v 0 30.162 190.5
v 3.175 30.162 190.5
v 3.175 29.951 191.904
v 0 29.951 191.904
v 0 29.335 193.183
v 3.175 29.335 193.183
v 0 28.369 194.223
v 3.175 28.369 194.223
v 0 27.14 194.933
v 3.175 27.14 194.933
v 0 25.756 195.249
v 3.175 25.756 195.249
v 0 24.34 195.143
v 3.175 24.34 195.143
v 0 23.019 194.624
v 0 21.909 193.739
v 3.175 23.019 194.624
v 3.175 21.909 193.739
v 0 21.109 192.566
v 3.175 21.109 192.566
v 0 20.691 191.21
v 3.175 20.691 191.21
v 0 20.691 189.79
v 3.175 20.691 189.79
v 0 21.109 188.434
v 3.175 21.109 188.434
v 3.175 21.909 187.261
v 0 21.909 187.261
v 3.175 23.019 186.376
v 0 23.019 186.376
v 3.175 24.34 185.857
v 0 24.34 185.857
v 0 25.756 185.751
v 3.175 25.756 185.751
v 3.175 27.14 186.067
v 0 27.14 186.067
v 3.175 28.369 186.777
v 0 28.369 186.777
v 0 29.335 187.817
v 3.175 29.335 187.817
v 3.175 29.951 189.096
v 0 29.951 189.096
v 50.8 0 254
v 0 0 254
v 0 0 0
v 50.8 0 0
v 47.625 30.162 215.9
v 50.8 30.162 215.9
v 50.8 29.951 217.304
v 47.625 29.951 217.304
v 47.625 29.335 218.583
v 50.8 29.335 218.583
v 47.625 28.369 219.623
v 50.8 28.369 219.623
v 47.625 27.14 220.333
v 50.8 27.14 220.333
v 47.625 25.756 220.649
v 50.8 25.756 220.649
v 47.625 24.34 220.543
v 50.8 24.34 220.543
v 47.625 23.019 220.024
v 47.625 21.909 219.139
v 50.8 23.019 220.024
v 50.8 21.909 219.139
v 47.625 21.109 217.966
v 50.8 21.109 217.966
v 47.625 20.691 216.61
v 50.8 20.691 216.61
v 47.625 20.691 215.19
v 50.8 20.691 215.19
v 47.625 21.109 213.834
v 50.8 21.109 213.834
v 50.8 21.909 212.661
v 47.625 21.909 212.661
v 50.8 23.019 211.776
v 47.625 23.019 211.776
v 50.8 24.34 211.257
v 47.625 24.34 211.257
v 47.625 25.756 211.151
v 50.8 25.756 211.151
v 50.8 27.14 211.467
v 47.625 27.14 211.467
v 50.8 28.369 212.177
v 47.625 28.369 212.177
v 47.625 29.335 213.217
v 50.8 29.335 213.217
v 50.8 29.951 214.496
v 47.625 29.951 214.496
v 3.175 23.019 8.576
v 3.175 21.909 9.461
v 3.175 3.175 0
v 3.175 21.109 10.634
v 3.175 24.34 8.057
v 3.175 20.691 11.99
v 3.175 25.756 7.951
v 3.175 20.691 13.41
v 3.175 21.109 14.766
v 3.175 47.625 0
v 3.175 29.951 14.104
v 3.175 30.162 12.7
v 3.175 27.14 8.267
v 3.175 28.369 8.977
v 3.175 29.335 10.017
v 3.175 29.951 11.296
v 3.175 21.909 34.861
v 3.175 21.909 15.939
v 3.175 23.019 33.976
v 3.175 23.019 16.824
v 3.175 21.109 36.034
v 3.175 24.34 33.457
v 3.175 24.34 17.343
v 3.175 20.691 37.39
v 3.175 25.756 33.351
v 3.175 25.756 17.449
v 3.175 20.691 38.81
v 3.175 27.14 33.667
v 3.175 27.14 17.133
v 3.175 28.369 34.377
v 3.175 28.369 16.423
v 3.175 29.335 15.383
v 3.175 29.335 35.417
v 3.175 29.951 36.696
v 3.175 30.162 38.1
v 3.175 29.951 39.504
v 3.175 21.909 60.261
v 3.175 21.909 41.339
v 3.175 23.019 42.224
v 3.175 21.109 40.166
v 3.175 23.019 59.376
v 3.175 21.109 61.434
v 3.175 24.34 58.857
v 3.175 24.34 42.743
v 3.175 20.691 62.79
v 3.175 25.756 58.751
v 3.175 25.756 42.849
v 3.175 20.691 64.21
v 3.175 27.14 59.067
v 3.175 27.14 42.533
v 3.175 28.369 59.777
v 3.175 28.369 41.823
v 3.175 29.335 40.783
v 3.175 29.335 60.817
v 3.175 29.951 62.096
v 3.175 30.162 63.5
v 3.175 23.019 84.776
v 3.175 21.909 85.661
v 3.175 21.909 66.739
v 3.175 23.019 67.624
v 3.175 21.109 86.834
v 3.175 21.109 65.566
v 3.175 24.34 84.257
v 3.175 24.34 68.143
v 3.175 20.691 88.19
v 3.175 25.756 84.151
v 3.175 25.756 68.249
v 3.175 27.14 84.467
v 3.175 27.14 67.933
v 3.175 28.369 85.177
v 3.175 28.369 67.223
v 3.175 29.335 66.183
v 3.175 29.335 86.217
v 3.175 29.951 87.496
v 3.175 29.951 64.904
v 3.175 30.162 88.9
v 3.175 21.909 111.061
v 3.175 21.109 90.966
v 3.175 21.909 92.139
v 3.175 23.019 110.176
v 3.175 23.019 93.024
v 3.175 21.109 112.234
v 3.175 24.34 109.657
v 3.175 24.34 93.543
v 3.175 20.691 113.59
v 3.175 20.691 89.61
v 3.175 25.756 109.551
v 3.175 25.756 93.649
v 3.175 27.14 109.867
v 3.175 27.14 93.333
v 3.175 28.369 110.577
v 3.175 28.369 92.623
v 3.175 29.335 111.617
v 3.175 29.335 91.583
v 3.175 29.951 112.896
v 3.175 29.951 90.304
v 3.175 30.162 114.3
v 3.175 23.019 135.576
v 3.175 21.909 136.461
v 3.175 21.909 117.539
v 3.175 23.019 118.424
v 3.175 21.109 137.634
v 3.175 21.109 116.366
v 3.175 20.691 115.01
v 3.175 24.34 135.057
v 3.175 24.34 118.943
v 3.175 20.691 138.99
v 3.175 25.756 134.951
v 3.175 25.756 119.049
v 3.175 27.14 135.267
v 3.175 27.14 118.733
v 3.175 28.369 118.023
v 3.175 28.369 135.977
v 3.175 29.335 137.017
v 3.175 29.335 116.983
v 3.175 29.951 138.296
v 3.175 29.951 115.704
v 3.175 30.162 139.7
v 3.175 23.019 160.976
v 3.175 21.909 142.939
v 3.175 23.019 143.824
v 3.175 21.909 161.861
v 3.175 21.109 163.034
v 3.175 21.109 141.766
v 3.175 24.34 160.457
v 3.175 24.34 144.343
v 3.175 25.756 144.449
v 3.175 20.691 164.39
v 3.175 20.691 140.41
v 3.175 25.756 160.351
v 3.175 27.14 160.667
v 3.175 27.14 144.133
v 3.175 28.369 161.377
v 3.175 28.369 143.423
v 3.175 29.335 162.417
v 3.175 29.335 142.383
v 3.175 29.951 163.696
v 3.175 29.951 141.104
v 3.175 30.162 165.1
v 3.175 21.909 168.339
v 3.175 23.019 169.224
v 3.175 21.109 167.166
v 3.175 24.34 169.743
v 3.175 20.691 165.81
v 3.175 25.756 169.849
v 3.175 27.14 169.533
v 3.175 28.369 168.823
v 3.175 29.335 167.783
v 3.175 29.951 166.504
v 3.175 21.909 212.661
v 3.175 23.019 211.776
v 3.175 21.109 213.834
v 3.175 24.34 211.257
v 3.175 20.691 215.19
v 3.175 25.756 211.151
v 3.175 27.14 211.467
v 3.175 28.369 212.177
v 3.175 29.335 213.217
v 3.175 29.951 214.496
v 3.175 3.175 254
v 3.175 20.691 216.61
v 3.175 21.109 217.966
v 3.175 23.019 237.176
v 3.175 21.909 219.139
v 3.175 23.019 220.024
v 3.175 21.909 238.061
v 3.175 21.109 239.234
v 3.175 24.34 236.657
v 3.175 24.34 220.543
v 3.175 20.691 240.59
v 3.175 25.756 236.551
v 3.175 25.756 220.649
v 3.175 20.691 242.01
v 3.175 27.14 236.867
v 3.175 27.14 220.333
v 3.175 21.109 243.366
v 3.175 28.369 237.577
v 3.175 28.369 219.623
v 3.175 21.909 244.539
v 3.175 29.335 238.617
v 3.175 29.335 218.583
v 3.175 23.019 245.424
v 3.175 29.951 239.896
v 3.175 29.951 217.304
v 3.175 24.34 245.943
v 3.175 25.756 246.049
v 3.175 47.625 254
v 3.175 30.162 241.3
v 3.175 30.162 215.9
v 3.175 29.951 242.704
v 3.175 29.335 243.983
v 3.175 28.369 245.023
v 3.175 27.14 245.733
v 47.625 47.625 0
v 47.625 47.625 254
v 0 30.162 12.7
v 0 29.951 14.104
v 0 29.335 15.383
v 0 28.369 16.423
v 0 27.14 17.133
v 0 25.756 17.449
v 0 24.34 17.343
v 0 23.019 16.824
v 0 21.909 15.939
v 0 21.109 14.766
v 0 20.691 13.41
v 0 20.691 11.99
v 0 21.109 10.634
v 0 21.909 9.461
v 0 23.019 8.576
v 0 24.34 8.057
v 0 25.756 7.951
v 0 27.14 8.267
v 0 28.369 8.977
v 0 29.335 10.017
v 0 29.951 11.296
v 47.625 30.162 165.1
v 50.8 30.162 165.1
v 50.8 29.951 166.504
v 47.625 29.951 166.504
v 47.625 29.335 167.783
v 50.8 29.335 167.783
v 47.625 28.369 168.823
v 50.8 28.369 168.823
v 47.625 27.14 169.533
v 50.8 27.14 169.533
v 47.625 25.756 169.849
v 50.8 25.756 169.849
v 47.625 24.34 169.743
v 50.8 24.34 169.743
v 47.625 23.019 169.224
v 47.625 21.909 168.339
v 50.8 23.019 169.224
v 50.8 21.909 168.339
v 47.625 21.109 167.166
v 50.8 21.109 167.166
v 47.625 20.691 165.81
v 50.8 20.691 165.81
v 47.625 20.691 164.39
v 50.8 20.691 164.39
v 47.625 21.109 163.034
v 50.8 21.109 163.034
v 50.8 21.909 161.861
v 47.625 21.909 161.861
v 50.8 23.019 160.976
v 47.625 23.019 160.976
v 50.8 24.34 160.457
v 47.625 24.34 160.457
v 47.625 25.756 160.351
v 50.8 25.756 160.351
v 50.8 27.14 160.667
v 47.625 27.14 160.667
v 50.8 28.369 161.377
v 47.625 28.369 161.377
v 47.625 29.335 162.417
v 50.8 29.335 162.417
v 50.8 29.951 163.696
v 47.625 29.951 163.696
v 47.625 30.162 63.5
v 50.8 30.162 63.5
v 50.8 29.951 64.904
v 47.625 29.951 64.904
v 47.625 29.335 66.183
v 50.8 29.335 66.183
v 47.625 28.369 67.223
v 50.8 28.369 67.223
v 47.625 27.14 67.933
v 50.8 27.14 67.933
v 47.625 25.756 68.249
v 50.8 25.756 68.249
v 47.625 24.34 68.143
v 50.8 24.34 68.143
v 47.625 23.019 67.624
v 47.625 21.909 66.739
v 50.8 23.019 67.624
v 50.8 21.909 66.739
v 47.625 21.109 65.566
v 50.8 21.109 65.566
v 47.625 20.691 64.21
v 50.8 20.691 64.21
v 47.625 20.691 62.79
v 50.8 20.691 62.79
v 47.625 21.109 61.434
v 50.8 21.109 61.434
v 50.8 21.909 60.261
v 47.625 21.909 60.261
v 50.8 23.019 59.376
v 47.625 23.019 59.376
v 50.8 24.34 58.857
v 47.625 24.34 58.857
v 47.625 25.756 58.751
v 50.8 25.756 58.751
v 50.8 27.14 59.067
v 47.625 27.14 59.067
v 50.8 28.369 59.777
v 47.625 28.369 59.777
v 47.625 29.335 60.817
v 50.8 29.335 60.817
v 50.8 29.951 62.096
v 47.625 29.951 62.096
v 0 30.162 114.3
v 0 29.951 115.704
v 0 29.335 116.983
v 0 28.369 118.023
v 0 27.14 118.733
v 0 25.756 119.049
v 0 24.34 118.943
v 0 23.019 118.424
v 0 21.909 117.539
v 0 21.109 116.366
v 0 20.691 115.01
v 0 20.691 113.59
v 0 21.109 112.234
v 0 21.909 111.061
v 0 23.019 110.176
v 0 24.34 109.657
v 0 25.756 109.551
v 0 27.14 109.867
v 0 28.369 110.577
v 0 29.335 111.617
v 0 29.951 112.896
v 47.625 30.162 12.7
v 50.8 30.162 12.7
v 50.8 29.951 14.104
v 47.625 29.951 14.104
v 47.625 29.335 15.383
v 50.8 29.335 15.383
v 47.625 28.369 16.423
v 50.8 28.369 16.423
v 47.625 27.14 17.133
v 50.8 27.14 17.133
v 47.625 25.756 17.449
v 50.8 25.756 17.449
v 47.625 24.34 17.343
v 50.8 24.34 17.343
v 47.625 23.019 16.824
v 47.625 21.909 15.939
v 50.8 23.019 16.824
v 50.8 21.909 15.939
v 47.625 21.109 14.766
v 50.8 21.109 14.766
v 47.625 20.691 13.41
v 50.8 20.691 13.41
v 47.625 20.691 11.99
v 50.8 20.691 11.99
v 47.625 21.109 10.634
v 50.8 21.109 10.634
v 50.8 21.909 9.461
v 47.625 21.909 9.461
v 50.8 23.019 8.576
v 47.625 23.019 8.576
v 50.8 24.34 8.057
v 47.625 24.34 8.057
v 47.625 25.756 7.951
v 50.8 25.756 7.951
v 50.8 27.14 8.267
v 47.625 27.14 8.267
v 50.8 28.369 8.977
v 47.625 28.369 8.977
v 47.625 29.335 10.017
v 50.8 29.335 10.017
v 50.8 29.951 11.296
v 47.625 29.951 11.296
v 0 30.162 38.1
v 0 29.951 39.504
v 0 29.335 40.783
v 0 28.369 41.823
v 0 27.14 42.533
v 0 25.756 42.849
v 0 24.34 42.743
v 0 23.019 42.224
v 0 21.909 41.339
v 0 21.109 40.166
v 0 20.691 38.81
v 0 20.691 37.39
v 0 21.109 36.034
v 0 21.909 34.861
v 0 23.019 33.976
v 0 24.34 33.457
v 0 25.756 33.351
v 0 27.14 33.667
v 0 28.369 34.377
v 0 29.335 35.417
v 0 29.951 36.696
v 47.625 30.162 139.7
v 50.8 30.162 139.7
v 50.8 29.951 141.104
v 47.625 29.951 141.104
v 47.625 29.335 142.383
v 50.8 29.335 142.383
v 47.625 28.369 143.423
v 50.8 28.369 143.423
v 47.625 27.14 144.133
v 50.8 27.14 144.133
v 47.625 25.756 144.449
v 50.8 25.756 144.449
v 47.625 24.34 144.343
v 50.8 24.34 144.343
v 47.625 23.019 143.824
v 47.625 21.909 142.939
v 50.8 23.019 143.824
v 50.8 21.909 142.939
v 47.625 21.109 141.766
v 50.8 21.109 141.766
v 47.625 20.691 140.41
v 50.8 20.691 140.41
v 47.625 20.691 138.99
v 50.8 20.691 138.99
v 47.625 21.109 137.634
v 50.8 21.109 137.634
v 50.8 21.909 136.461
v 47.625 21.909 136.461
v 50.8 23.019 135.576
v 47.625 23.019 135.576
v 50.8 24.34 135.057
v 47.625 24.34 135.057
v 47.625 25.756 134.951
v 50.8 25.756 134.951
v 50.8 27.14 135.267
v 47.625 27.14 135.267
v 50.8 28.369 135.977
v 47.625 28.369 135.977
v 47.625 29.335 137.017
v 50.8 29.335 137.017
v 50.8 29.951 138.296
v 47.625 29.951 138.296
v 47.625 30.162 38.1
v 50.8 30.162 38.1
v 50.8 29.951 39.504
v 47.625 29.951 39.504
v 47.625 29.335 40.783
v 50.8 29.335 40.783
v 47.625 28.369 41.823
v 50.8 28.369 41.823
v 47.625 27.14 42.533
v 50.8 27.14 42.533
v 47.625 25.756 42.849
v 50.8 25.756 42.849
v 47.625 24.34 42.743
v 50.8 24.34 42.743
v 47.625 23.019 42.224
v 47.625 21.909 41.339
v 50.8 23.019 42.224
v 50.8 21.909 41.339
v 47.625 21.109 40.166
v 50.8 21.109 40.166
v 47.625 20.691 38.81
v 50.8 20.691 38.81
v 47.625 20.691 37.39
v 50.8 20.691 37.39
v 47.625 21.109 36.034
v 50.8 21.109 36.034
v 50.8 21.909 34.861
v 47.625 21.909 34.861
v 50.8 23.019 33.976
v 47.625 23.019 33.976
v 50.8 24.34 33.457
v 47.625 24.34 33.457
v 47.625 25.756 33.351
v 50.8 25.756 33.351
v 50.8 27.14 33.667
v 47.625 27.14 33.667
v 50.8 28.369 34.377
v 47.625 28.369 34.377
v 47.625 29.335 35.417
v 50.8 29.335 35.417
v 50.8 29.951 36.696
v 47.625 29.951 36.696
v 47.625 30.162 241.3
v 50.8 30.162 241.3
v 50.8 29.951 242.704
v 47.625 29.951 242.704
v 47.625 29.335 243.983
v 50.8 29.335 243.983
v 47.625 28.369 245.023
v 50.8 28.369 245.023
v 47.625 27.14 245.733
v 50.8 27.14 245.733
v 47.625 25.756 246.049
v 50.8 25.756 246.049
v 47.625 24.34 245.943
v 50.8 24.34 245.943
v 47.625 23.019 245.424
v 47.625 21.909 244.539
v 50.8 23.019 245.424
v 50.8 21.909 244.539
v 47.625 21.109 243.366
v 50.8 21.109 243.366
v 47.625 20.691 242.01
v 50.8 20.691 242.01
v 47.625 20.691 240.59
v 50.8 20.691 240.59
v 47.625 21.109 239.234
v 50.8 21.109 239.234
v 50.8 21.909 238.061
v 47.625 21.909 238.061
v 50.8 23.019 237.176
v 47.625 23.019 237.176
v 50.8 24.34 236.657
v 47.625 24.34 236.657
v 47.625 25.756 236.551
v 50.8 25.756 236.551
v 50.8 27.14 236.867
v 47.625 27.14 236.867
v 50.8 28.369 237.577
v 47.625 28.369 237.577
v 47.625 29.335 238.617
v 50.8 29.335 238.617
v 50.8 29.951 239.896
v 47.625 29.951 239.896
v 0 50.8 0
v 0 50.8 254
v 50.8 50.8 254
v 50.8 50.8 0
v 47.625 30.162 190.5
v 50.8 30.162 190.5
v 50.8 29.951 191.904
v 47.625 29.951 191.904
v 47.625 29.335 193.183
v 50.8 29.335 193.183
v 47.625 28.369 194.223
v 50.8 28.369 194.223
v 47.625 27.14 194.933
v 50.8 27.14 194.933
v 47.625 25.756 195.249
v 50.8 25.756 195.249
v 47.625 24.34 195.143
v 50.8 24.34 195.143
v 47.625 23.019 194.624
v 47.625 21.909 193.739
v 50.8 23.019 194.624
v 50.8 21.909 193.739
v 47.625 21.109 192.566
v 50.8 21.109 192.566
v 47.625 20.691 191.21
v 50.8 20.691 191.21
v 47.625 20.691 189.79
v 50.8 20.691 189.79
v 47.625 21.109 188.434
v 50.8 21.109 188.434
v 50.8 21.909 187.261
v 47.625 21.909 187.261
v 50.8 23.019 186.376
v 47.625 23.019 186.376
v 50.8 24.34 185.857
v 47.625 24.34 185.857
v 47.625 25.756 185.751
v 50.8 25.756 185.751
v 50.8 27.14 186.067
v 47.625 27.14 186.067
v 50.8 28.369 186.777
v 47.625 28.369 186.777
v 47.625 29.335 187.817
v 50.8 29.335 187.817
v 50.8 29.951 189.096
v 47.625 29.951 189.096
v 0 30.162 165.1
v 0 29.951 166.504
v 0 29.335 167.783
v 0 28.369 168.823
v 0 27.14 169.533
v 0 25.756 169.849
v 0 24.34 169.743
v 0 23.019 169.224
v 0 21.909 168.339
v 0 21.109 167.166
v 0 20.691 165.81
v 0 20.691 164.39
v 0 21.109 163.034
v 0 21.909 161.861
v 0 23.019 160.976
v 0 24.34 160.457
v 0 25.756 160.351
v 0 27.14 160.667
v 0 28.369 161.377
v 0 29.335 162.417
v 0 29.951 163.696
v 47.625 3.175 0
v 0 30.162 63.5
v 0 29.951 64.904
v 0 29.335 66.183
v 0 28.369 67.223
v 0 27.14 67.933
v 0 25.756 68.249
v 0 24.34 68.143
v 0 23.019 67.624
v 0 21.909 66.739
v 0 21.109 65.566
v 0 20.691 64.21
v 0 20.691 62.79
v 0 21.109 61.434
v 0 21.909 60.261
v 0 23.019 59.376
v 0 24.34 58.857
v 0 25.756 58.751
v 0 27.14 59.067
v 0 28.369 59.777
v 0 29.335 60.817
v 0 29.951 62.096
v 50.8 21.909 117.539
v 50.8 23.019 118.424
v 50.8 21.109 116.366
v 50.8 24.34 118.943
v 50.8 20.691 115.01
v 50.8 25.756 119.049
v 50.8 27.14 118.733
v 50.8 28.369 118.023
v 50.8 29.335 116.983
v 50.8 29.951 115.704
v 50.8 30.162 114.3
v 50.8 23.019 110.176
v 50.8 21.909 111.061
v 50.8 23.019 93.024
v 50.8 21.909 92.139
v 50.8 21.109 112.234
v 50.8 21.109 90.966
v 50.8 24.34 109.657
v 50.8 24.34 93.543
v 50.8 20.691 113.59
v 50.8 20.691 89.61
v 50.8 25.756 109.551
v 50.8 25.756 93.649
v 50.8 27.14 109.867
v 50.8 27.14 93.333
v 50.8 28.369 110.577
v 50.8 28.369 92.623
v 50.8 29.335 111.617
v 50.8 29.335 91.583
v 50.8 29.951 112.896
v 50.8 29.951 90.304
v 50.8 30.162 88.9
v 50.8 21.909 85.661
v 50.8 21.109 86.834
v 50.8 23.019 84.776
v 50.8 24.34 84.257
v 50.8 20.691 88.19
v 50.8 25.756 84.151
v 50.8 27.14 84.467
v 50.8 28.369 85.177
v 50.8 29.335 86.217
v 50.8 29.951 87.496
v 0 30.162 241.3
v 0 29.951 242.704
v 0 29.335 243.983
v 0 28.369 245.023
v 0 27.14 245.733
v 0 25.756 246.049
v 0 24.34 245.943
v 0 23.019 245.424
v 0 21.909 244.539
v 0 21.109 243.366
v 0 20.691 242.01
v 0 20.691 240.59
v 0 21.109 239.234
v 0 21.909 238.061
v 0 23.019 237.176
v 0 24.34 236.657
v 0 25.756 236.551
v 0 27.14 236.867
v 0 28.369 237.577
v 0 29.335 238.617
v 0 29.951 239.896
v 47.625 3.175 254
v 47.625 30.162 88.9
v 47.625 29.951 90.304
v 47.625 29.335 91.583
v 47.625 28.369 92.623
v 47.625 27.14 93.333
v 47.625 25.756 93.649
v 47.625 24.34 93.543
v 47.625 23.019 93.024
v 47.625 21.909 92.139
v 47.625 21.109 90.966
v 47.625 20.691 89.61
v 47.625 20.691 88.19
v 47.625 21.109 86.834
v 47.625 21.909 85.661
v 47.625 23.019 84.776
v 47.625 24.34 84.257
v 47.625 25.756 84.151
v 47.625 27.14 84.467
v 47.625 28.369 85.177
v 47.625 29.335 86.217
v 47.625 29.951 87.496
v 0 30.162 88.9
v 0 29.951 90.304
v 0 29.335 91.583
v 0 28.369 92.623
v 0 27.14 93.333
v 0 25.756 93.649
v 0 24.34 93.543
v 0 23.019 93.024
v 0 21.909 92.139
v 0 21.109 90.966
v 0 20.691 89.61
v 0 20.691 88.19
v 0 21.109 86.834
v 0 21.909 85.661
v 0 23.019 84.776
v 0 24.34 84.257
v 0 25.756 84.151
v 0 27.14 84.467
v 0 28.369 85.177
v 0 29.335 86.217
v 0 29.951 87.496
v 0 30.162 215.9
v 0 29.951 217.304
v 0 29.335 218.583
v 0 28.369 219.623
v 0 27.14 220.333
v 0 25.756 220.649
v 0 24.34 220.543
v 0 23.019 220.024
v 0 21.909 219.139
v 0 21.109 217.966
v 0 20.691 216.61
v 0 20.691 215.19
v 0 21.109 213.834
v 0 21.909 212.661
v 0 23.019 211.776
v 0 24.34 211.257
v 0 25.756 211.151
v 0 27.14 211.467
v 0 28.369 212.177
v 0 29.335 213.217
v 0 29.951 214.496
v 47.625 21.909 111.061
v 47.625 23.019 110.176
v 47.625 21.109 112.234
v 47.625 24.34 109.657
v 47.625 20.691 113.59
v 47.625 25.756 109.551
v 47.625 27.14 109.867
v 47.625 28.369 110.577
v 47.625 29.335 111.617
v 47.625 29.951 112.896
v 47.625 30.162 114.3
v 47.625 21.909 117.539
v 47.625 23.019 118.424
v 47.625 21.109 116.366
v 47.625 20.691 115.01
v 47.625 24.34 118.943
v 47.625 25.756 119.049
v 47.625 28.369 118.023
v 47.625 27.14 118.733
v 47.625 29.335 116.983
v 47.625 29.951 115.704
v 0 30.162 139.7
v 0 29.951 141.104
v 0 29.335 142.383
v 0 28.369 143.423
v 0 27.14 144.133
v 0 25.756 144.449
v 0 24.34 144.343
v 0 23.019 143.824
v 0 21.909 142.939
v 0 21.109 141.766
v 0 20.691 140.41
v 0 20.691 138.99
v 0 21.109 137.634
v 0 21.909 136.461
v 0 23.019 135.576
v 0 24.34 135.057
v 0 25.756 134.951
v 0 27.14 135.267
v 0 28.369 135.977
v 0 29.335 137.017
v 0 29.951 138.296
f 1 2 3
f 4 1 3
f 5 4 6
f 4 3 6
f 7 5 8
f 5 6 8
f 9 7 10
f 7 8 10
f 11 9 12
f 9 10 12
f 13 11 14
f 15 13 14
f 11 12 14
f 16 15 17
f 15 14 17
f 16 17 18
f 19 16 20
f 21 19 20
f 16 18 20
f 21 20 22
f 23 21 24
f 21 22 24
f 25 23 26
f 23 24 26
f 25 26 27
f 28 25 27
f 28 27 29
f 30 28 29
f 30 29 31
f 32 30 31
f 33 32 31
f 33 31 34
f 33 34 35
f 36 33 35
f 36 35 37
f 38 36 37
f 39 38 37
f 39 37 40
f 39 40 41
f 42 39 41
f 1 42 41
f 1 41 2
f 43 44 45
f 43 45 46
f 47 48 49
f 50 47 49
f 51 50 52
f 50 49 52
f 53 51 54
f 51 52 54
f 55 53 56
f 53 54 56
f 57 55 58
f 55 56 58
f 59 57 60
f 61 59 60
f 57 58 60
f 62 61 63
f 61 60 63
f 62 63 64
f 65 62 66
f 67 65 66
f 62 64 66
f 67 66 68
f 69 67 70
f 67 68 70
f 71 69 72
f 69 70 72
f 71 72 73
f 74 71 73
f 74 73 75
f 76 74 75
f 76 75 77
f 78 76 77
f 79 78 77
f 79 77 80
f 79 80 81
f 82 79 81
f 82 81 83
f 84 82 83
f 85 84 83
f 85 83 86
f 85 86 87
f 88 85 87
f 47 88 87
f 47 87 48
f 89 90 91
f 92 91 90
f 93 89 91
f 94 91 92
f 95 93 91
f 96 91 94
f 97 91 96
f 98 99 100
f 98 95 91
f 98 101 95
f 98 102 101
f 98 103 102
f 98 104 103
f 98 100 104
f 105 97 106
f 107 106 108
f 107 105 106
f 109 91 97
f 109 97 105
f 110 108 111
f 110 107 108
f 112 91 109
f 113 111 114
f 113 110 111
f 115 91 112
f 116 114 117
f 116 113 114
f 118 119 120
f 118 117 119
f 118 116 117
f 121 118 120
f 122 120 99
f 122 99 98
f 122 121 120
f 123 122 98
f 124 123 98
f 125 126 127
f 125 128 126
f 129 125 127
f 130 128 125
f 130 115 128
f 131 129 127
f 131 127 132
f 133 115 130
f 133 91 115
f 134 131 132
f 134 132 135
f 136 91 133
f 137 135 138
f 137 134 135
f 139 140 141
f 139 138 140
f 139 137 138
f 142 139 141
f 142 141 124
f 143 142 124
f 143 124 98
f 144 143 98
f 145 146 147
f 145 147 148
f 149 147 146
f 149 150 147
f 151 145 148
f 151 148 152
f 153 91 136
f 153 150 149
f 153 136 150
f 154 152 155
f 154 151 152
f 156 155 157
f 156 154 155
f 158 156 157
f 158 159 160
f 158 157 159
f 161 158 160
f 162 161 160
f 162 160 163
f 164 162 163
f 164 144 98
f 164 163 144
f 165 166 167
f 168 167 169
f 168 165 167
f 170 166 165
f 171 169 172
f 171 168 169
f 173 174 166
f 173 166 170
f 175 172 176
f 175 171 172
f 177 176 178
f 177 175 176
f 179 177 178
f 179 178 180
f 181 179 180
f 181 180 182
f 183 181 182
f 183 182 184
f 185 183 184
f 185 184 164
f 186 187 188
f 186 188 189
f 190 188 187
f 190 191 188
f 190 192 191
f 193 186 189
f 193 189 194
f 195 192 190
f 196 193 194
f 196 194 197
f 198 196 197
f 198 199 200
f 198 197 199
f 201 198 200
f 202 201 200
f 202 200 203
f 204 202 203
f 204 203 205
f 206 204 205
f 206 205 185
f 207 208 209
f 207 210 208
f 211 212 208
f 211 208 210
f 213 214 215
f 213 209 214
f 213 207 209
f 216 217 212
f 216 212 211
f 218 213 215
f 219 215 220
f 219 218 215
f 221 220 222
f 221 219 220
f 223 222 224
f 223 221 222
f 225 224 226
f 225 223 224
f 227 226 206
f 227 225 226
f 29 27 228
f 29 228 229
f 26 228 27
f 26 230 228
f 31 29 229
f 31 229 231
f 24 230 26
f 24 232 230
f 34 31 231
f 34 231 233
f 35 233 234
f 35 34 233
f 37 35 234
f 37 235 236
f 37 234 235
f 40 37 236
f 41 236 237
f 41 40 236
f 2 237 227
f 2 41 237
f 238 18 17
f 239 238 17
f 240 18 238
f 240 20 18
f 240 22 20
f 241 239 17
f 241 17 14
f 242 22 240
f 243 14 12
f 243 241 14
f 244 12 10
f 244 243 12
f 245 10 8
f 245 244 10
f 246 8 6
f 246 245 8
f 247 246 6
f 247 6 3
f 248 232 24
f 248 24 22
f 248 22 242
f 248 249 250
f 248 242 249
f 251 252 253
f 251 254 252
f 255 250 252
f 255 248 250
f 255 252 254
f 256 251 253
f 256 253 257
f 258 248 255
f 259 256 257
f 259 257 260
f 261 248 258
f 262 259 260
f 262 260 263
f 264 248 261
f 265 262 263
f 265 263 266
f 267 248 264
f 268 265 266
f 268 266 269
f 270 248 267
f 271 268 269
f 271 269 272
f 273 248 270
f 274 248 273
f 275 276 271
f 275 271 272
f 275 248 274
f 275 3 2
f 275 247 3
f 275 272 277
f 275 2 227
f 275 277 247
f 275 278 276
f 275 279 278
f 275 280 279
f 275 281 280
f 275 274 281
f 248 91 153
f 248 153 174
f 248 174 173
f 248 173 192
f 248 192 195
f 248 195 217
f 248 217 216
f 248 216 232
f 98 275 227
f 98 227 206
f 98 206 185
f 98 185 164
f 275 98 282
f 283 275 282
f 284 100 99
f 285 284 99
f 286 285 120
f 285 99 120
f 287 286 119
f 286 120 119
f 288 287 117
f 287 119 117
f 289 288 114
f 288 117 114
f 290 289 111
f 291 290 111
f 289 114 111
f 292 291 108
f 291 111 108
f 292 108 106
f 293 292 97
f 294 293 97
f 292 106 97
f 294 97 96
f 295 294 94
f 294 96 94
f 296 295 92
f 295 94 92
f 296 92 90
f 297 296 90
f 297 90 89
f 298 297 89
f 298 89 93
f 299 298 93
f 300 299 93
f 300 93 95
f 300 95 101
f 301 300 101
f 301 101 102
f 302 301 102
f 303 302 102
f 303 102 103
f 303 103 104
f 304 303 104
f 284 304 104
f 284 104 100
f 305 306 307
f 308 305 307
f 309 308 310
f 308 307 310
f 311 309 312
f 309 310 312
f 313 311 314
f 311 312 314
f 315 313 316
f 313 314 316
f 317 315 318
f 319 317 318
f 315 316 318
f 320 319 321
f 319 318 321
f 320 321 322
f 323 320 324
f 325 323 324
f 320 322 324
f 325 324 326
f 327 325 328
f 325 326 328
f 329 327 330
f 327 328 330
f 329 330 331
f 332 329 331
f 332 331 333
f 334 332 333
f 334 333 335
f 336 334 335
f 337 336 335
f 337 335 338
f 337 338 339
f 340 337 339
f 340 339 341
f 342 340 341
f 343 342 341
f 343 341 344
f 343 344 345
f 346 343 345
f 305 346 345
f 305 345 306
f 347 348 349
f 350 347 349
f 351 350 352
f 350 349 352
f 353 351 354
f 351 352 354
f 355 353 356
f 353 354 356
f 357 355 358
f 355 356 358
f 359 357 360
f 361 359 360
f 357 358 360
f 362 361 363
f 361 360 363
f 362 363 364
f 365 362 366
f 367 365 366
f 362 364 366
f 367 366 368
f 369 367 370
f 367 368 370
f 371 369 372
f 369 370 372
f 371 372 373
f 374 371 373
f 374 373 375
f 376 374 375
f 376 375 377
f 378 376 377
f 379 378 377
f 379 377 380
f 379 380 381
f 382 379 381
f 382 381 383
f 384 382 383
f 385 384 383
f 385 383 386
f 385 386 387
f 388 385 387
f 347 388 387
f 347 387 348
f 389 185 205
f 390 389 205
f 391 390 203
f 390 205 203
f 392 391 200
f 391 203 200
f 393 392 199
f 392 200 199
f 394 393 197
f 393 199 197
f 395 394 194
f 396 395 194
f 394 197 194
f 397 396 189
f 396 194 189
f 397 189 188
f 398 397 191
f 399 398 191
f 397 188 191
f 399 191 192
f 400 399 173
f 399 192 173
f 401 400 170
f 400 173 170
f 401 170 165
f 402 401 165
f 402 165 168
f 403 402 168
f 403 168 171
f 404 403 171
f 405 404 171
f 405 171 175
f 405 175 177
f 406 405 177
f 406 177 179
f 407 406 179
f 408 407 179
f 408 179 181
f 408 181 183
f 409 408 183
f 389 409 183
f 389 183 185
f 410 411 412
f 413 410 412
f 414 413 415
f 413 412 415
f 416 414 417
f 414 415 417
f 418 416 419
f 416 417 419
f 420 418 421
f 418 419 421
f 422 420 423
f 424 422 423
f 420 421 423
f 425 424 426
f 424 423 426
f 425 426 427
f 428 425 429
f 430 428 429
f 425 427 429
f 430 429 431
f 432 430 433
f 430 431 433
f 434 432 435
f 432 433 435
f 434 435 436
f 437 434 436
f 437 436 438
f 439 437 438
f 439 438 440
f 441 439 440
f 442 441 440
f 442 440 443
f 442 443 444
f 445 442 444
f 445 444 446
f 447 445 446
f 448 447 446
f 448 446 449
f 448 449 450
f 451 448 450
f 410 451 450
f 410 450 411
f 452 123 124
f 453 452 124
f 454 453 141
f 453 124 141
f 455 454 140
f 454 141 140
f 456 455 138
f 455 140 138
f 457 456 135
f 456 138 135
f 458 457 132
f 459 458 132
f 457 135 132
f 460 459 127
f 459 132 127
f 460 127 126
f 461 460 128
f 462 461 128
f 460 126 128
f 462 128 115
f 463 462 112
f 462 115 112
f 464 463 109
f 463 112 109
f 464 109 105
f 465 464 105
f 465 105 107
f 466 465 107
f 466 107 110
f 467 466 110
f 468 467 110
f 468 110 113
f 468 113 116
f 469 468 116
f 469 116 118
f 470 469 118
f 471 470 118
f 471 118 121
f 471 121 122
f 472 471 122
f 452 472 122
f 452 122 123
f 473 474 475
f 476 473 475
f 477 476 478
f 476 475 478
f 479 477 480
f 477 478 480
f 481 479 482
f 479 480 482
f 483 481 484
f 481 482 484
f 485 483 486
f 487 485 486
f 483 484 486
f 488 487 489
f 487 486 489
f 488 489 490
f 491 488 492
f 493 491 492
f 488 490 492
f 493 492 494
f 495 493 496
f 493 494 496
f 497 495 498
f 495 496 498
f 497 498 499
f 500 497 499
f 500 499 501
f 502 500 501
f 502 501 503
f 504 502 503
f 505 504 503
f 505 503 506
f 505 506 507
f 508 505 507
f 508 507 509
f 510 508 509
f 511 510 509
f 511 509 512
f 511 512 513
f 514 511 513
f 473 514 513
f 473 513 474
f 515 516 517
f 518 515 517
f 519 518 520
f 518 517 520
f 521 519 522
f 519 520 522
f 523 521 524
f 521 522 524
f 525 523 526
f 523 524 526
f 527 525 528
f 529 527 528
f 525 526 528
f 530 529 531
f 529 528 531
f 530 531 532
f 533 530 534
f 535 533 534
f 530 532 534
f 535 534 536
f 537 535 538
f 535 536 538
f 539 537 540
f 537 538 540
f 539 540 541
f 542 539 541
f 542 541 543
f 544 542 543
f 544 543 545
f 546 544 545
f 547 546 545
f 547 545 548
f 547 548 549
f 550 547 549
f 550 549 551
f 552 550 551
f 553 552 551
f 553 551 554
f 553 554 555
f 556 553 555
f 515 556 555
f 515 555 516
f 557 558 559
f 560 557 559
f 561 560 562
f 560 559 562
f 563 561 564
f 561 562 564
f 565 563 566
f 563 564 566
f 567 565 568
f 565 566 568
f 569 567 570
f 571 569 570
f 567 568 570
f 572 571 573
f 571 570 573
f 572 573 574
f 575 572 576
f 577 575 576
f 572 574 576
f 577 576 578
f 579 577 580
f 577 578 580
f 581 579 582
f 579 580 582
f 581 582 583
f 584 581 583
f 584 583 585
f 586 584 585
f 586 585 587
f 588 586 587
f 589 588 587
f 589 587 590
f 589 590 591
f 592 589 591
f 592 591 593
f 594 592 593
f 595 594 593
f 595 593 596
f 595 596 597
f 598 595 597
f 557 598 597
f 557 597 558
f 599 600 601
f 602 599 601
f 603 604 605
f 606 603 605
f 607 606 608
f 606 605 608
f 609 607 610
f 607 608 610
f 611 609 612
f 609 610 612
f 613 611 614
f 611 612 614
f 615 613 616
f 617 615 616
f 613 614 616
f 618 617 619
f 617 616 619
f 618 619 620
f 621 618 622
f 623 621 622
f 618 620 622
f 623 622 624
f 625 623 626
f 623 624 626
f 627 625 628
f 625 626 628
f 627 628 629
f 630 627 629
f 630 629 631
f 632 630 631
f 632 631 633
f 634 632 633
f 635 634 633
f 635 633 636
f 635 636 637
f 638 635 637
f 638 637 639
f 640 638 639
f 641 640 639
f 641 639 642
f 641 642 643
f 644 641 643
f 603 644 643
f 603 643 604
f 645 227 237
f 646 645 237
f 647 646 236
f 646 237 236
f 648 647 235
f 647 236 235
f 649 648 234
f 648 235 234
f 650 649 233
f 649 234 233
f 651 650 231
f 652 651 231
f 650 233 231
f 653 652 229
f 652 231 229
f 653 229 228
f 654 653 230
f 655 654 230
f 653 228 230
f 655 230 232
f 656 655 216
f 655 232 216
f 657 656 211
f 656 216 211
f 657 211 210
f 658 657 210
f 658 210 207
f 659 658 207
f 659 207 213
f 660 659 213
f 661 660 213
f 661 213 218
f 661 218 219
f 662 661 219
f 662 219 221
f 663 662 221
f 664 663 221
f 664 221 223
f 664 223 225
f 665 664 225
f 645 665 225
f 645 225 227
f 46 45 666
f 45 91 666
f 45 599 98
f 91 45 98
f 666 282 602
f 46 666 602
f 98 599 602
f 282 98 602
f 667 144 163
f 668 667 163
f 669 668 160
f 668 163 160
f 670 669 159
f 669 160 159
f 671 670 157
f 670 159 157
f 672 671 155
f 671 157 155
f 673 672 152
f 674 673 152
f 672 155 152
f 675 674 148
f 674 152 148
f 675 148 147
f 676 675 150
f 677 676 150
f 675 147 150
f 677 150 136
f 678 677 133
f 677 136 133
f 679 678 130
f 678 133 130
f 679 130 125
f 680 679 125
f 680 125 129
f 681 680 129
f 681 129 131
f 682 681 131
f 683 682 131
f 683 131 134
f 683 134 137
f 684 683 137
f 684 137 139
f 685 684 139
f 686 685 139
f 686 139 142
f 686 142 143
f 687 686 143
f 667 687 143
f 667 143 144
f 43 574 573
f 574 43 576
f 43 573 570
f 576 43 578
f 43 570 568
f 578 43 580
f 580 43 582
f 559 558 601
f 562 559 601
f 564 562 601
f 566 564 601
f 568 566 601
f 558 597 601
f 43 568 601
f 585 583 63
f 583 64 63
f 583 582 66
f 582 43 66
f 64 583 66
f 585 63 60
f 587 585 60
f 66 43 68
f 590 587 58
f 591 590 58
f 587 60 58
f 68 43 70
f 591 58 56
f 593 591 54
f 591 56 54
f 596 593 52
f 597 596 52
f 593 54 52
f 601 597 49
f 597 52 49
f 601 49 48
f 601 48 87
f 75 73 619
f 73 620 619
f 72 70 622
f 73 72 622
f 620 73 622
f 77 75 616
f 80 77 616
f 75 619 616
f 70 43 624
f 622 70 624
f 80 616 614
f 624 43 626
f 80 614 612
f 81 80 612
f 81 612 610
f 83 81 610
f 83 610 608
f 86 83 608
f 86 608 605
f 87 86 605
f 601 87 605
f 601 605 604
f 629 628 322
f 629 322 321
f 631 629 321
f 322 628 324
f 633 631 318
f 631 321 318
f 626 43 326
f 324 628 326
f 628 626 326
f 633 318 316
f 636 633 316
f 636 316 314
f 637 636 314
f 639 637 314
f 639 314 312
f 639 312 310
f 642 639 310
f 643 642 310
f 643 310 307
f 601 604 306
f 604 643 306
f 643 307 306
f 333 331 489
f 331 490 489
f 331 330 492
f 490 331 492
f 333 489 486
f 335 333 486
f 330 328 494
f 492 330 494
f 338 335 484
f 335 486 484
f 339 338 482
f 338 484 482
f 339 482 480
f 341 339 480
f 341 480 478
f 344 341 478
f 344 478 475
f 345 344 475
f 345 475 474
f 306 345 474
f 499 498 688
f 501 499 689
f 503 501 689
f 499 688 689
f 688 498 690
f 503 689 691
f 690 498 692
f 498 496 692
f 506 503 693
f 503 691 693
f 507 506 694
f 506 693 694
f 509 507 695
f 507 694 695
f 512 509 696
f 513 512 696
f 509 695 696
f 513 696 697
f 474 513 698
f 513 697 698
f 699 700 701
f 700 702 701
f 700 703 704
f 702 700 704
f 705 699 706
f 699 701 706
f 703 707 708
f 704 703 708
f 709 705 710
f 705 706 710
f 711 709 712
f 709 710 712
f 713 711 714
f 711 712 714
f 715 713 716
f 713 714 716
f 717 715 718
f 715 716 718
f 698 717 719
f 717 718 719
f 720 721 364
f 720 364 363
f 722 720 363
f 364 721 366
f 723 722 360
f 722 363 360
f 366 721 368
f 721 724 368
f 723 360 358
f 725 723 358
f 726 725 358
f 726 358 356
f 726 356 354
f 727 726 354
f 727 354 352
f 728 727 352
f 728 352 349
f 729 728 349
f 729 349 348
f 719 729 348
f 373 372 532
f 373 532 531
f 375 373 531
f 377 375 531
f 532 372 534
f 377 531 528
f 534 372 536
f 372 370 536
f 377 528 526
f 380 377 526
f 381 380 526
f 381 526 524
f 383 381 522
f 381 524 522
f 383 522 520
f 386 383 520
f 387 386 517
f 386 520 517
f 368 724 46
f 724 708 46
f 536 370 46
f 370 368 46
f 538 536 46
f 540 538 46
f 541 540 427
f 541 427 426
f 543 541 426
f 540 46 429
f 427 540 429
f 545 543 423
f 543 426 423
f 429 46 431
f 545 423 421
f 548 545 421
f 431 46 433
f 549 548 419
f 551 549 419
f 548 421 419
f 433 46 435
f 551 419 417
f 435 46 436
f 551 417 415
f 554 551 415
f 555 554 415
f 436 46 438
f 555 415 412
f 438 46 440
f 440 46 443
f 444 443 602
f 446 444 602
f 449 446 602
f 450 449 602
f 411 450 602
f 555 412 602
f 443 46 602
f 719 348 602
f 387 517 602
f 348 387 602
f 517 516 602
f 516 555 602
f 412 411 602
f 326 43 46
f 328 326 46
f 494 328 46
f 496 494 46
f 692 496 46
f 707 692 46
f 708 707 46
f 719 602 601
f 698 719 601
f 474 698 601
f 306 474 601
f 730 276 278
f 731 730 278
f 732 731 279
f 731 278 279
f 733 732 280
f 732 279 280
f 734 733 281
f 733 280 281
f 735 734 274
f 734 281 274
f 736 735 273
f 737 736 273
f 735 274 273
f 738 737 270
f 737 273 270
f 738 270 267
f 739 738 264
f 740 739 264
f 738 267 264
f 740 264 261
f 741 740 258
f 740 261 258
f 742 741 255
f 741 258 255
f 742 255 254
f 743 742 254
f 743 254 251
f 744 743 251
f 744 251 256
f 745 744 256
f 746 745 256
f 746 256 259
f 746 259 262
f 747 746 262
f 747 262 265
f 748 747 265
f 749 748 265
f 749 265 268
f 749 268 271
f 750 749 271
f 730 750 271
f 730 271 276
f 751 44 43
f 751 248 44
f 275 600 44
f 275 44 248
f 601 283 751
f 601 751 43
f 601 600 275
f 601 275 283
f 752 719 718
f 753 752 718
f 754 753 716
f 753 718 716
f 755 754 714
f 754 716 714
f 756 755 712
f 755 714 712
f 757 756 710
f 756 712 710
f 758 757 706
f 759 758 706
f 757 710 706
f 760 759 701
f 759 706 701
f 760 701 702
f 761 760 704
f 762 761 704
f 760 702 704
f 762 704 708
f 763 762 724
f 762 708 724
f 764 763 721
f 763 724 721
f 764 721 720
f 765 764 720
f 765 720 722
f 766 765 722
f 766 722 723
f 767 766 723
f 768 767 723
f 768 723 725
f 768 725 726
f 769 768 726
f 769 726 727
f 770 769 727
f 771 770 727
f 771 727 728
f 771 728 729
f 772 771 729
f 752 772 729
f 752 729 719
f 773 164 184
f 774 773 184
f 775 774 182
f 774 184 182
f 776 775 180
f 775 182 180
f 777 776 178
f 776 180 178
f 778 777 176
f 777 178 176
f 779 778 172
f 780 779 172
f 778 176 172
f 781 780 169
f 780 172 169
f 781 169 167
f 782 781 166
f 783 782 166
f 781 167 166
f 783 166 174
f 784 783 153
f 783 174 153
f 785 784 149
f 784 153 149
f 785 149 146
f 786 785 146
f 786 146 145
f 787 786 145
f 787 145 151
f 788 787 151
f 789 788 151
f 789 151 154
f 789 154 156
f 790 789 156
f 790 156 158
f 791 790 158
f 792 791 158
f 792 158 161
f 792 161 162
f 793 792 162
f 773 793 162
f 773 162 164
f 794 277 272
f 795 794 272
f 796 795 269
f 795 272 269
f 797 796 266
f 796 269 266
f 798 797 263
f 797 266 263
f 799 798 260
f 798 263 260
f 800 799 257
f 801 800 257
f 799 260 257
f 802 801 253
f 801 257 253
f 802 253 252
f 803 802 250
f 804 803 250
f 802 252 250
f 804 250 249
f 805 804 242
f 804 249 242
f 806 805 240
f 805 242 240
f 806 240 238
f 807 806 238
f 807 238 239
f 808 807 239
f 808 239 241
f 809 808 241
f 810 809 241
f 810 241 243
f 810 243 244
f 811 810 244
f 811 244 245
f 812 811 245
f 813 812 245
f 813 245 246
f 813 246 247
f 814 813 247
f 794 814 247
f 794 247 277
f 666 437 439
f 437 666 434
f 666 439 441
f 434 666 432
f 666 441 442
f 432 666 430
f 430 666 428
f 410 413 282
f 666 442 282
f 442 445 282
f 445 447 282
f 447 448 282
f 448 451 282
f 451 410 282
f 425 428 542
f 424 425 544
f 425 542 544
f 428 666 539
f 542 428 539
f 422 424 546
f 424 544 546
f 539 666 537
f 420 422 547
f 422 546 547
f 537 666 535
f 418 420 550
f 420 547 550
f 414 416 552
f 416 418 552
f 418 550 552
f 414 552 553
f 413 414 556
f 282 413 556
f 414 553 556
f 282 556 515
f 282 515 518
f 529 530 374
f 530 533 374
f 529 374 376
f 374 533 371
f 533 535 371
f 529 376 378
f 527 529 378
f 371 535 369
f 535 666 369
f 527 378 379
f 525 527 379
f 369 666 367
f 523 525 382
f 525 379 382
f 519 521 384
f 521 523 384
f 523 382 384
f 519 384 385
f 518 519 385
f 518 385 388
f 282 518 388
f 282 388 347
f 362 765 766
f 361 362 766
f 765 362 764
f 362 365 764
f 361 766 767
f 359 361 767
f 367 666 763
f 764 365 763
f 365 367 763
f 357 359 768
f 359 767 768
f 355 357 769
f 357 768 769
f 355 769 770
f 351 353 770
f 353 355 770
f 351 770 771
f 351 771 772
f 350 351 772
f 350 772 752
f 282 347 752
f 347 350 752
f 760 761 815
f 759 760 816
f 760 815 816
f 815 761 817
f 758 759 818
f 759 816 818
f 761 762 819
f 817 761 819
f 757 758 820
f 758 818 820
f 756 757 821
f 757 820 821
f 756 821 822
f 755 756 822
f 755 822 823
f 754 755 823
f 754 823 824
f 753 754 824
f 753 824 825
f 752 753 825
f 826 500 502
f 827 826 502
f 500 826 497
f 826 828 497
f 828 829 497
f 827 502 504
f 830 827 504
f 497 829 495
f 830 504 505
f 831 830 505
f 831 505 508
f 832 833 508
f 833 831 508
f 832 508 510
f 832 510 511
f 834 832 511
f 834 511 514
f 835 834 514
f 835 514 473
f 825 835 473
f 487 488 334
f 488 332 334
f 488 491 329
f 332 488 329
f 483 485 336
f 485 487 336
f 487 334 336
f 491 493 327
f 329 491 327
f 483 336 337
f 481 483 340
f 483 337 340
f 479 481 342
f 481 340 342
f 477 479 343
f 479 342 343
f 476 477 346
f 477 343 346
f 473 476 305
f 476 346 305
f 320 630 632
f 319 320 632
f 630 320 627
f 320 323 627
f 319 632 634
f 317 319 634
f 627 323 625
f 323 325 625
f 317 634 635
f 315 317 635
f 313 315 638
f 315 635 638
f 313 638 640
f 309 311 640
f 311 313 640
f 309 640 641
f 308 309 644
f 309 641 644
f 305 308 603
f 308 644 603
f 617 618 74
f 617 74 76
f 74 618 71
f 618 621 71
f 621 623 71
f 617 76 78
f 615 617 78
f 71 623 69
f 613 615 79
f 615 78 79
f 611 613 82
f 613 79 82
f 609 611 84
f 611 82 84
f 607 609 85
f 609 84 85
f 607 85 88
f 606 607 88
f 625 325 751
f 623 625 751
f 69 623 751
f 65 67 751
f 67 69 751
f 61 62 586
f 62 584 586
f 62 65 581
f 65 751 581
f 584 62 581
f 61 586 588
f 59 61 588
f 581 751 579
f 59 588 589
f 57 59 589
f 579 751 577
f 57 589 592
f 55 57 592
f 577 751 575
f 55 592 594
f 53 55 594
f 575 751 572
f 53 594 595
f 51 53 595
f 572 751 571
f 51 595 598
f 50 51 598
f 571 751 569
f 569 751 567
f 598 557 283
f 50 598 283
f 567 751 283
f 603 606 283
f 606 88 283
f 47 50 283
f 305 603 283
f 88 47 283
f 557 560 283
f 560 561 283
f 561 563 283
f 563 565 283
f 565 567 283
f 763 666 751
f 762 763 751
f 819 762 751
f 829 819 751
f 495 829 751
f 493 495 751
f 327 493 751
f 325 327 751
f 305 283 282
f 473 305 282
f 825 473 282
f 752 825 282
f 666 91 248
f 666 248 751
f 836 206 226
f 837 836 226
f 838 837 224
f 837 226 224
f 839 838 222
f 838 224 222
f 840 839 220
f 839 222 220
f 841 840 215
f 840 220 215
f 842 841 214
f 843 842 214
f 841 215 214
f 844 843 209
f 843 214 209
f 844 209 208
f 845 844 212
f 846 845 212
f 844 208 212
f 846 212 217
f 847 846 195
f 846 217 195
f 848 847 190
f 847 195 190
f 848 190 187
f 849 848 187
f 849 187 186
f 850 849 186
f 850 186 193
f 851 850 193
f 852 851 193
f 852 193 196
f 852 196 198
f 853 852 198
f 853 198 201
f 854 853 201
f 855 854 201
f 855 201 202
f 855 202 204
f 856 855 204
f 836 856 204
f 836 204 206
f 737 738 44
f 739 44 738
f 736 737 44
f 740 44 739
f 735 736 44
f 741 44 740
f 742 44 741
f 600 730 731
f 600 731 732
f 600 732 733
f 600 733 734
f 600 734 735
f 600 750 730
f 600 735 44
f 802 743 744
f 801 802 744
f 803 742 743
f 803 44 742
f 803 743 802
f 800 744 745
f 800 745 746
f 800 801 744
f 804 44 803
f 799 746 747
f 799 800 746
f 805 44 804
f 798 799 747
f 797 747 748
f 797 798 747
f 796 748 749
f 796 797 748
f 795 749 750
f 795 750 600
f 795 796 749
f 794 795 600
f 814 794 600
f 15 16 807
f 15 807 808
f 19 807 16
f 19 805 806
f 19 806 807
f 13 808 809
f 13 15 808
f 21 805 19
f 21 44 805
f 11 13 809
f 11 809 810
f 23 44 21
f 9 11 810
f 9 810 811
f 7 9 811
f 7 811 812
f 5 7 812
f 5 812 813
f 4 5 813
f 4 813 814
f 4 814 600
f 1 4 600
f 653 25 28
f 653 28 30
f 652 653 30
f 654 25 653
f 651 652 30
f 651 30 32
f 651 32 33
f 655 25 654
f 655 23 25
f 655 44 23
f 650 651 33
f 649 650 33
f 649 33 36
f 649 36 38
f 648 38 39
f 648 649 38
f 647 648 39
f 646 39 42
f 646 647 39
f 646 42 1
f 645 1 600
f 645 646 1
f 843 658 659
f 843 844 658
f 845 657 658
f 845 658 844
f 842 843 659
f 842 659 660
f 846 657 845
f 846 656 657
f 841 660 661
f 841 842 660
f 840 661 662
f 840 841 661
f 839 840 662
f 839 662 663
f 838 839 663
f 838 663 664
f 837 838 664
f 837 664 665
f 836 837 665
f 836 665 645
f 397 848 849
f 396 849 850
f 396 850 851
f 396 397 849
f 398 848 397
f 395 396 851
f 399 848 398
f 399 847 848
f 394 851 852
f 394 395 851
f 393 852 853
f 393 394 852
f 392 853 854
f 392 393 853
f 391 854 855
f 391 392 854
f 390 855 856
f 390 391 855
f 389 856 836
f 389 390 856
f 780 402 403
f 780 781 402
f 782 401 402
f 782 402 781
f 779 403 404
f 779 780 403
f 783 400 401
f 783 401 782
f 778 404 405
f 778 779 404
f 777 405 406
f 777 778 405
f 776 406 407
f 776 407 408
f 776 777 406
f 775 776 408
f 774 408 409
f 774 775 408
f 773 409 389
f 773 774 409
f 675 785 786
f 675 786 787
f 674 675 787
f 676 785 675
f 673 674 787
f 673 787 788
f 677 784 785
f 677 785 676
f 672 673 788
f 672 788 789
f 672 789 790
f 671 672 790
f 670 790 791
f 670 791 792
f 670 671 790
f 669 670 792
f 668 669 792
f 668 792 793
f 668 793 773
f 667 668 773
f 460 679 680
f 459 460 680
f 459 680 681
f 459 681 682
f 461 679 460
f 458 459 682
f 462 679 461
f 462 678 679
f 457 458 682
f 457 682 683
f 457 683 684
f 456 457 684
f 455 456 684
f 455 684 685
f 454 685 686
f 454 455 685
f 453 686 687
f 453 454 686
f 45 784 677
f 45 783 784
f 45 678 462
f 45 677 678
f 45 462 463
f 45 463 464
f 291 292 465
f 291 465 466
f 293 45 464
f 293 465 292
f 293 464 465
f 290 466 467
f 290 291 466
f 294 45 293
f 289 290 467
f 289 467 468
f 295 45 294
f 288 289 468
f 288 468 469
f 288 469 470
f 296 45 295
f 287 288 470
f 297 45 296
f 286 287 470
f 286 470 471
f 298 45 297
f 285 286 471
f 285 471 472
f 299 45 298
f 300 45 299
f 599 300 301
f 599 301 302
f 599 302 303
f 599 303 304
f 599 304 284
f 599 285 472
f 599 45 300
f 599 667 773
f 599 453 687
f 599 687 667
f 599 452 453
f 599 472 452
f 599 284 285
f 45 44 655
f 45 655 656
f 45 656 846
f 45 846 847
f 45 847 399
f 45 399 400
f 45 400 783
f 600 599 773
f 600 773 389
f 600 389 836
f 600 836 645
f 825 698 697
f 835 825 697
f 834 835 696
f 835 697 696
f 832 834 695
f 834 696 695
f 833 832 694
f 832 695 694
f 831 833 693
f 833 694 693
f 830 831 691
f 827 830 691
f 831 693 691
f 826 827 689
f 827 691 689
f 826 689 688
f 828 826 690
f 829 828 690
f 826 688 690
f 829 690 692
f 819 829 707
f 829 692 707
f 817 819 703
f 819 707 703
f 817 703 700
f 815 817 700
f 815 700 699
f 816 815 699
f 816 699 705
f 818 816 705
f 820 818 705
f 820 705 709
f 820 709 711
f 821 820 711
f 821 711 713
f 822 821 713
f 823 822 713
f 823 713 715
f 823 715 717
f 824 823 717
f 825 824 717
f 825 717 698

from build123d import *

# Parameters (mm, degrees)
F0_W     = 50.8
F0_H     = 50.8
F1_DEPTH = 254
F2_W     = 44.45
F2_H     = 44.45
F3_DEPTH = 254.001
F4_R     = 4.7625
F5_DEPTH = 50.801


with BuildPart() as f1:
    # F0 (on Top) → F1 (new body)
    with BuildSketch(Plane.XY):
        with Locations((25.4, 25.4)):
            Rectangle(F0_W, F0_H)
    extrude(amount=F1_DEPTH)

    # F2 (on face) → F3 (cut, through all)
    with BuildSketch(Plane.XY.offset(254)):
        with Locations((25.4, 25.4)):
            Rectangle(F2_W, F2_H)
    extrude(amount=-F3_DEPTH, mode=Mode.SUBTRACT)

    # F4 (on face) → F5 (cut, through all)
    with BuildSketch(Plane.YZ.offset(50.8)):
        with Locations((25.4, 12.7)):
            Circle(F4_R)
        with Locations((25.4, 38.1)):
            Circle(F4_R)
        with Locations((25.4, 63.5)):
            Circle(F4_R)
        with Locations((25.4, 88.9)):
            Circle(F4_R)
        with Locations((25.4, 114.3)):
            Circle(F4_R)
        with Locations((25.4, 139.7)):
            Circle(F4_R)
        with Locations((25.4, 165.1)):
            Circle(F4_R)
        with Locations((25.4, 190.5)):
            Circle(F4_R)
        with Locations((25.4, 215.9)):
            Circle(F4_R)
        with Locations((25.4, 241.3)):
            Circle(F4_R)
    extrude(amount=-F5_DEPTH, mode=Mode.SUBTRACT)


solid = f1.part
